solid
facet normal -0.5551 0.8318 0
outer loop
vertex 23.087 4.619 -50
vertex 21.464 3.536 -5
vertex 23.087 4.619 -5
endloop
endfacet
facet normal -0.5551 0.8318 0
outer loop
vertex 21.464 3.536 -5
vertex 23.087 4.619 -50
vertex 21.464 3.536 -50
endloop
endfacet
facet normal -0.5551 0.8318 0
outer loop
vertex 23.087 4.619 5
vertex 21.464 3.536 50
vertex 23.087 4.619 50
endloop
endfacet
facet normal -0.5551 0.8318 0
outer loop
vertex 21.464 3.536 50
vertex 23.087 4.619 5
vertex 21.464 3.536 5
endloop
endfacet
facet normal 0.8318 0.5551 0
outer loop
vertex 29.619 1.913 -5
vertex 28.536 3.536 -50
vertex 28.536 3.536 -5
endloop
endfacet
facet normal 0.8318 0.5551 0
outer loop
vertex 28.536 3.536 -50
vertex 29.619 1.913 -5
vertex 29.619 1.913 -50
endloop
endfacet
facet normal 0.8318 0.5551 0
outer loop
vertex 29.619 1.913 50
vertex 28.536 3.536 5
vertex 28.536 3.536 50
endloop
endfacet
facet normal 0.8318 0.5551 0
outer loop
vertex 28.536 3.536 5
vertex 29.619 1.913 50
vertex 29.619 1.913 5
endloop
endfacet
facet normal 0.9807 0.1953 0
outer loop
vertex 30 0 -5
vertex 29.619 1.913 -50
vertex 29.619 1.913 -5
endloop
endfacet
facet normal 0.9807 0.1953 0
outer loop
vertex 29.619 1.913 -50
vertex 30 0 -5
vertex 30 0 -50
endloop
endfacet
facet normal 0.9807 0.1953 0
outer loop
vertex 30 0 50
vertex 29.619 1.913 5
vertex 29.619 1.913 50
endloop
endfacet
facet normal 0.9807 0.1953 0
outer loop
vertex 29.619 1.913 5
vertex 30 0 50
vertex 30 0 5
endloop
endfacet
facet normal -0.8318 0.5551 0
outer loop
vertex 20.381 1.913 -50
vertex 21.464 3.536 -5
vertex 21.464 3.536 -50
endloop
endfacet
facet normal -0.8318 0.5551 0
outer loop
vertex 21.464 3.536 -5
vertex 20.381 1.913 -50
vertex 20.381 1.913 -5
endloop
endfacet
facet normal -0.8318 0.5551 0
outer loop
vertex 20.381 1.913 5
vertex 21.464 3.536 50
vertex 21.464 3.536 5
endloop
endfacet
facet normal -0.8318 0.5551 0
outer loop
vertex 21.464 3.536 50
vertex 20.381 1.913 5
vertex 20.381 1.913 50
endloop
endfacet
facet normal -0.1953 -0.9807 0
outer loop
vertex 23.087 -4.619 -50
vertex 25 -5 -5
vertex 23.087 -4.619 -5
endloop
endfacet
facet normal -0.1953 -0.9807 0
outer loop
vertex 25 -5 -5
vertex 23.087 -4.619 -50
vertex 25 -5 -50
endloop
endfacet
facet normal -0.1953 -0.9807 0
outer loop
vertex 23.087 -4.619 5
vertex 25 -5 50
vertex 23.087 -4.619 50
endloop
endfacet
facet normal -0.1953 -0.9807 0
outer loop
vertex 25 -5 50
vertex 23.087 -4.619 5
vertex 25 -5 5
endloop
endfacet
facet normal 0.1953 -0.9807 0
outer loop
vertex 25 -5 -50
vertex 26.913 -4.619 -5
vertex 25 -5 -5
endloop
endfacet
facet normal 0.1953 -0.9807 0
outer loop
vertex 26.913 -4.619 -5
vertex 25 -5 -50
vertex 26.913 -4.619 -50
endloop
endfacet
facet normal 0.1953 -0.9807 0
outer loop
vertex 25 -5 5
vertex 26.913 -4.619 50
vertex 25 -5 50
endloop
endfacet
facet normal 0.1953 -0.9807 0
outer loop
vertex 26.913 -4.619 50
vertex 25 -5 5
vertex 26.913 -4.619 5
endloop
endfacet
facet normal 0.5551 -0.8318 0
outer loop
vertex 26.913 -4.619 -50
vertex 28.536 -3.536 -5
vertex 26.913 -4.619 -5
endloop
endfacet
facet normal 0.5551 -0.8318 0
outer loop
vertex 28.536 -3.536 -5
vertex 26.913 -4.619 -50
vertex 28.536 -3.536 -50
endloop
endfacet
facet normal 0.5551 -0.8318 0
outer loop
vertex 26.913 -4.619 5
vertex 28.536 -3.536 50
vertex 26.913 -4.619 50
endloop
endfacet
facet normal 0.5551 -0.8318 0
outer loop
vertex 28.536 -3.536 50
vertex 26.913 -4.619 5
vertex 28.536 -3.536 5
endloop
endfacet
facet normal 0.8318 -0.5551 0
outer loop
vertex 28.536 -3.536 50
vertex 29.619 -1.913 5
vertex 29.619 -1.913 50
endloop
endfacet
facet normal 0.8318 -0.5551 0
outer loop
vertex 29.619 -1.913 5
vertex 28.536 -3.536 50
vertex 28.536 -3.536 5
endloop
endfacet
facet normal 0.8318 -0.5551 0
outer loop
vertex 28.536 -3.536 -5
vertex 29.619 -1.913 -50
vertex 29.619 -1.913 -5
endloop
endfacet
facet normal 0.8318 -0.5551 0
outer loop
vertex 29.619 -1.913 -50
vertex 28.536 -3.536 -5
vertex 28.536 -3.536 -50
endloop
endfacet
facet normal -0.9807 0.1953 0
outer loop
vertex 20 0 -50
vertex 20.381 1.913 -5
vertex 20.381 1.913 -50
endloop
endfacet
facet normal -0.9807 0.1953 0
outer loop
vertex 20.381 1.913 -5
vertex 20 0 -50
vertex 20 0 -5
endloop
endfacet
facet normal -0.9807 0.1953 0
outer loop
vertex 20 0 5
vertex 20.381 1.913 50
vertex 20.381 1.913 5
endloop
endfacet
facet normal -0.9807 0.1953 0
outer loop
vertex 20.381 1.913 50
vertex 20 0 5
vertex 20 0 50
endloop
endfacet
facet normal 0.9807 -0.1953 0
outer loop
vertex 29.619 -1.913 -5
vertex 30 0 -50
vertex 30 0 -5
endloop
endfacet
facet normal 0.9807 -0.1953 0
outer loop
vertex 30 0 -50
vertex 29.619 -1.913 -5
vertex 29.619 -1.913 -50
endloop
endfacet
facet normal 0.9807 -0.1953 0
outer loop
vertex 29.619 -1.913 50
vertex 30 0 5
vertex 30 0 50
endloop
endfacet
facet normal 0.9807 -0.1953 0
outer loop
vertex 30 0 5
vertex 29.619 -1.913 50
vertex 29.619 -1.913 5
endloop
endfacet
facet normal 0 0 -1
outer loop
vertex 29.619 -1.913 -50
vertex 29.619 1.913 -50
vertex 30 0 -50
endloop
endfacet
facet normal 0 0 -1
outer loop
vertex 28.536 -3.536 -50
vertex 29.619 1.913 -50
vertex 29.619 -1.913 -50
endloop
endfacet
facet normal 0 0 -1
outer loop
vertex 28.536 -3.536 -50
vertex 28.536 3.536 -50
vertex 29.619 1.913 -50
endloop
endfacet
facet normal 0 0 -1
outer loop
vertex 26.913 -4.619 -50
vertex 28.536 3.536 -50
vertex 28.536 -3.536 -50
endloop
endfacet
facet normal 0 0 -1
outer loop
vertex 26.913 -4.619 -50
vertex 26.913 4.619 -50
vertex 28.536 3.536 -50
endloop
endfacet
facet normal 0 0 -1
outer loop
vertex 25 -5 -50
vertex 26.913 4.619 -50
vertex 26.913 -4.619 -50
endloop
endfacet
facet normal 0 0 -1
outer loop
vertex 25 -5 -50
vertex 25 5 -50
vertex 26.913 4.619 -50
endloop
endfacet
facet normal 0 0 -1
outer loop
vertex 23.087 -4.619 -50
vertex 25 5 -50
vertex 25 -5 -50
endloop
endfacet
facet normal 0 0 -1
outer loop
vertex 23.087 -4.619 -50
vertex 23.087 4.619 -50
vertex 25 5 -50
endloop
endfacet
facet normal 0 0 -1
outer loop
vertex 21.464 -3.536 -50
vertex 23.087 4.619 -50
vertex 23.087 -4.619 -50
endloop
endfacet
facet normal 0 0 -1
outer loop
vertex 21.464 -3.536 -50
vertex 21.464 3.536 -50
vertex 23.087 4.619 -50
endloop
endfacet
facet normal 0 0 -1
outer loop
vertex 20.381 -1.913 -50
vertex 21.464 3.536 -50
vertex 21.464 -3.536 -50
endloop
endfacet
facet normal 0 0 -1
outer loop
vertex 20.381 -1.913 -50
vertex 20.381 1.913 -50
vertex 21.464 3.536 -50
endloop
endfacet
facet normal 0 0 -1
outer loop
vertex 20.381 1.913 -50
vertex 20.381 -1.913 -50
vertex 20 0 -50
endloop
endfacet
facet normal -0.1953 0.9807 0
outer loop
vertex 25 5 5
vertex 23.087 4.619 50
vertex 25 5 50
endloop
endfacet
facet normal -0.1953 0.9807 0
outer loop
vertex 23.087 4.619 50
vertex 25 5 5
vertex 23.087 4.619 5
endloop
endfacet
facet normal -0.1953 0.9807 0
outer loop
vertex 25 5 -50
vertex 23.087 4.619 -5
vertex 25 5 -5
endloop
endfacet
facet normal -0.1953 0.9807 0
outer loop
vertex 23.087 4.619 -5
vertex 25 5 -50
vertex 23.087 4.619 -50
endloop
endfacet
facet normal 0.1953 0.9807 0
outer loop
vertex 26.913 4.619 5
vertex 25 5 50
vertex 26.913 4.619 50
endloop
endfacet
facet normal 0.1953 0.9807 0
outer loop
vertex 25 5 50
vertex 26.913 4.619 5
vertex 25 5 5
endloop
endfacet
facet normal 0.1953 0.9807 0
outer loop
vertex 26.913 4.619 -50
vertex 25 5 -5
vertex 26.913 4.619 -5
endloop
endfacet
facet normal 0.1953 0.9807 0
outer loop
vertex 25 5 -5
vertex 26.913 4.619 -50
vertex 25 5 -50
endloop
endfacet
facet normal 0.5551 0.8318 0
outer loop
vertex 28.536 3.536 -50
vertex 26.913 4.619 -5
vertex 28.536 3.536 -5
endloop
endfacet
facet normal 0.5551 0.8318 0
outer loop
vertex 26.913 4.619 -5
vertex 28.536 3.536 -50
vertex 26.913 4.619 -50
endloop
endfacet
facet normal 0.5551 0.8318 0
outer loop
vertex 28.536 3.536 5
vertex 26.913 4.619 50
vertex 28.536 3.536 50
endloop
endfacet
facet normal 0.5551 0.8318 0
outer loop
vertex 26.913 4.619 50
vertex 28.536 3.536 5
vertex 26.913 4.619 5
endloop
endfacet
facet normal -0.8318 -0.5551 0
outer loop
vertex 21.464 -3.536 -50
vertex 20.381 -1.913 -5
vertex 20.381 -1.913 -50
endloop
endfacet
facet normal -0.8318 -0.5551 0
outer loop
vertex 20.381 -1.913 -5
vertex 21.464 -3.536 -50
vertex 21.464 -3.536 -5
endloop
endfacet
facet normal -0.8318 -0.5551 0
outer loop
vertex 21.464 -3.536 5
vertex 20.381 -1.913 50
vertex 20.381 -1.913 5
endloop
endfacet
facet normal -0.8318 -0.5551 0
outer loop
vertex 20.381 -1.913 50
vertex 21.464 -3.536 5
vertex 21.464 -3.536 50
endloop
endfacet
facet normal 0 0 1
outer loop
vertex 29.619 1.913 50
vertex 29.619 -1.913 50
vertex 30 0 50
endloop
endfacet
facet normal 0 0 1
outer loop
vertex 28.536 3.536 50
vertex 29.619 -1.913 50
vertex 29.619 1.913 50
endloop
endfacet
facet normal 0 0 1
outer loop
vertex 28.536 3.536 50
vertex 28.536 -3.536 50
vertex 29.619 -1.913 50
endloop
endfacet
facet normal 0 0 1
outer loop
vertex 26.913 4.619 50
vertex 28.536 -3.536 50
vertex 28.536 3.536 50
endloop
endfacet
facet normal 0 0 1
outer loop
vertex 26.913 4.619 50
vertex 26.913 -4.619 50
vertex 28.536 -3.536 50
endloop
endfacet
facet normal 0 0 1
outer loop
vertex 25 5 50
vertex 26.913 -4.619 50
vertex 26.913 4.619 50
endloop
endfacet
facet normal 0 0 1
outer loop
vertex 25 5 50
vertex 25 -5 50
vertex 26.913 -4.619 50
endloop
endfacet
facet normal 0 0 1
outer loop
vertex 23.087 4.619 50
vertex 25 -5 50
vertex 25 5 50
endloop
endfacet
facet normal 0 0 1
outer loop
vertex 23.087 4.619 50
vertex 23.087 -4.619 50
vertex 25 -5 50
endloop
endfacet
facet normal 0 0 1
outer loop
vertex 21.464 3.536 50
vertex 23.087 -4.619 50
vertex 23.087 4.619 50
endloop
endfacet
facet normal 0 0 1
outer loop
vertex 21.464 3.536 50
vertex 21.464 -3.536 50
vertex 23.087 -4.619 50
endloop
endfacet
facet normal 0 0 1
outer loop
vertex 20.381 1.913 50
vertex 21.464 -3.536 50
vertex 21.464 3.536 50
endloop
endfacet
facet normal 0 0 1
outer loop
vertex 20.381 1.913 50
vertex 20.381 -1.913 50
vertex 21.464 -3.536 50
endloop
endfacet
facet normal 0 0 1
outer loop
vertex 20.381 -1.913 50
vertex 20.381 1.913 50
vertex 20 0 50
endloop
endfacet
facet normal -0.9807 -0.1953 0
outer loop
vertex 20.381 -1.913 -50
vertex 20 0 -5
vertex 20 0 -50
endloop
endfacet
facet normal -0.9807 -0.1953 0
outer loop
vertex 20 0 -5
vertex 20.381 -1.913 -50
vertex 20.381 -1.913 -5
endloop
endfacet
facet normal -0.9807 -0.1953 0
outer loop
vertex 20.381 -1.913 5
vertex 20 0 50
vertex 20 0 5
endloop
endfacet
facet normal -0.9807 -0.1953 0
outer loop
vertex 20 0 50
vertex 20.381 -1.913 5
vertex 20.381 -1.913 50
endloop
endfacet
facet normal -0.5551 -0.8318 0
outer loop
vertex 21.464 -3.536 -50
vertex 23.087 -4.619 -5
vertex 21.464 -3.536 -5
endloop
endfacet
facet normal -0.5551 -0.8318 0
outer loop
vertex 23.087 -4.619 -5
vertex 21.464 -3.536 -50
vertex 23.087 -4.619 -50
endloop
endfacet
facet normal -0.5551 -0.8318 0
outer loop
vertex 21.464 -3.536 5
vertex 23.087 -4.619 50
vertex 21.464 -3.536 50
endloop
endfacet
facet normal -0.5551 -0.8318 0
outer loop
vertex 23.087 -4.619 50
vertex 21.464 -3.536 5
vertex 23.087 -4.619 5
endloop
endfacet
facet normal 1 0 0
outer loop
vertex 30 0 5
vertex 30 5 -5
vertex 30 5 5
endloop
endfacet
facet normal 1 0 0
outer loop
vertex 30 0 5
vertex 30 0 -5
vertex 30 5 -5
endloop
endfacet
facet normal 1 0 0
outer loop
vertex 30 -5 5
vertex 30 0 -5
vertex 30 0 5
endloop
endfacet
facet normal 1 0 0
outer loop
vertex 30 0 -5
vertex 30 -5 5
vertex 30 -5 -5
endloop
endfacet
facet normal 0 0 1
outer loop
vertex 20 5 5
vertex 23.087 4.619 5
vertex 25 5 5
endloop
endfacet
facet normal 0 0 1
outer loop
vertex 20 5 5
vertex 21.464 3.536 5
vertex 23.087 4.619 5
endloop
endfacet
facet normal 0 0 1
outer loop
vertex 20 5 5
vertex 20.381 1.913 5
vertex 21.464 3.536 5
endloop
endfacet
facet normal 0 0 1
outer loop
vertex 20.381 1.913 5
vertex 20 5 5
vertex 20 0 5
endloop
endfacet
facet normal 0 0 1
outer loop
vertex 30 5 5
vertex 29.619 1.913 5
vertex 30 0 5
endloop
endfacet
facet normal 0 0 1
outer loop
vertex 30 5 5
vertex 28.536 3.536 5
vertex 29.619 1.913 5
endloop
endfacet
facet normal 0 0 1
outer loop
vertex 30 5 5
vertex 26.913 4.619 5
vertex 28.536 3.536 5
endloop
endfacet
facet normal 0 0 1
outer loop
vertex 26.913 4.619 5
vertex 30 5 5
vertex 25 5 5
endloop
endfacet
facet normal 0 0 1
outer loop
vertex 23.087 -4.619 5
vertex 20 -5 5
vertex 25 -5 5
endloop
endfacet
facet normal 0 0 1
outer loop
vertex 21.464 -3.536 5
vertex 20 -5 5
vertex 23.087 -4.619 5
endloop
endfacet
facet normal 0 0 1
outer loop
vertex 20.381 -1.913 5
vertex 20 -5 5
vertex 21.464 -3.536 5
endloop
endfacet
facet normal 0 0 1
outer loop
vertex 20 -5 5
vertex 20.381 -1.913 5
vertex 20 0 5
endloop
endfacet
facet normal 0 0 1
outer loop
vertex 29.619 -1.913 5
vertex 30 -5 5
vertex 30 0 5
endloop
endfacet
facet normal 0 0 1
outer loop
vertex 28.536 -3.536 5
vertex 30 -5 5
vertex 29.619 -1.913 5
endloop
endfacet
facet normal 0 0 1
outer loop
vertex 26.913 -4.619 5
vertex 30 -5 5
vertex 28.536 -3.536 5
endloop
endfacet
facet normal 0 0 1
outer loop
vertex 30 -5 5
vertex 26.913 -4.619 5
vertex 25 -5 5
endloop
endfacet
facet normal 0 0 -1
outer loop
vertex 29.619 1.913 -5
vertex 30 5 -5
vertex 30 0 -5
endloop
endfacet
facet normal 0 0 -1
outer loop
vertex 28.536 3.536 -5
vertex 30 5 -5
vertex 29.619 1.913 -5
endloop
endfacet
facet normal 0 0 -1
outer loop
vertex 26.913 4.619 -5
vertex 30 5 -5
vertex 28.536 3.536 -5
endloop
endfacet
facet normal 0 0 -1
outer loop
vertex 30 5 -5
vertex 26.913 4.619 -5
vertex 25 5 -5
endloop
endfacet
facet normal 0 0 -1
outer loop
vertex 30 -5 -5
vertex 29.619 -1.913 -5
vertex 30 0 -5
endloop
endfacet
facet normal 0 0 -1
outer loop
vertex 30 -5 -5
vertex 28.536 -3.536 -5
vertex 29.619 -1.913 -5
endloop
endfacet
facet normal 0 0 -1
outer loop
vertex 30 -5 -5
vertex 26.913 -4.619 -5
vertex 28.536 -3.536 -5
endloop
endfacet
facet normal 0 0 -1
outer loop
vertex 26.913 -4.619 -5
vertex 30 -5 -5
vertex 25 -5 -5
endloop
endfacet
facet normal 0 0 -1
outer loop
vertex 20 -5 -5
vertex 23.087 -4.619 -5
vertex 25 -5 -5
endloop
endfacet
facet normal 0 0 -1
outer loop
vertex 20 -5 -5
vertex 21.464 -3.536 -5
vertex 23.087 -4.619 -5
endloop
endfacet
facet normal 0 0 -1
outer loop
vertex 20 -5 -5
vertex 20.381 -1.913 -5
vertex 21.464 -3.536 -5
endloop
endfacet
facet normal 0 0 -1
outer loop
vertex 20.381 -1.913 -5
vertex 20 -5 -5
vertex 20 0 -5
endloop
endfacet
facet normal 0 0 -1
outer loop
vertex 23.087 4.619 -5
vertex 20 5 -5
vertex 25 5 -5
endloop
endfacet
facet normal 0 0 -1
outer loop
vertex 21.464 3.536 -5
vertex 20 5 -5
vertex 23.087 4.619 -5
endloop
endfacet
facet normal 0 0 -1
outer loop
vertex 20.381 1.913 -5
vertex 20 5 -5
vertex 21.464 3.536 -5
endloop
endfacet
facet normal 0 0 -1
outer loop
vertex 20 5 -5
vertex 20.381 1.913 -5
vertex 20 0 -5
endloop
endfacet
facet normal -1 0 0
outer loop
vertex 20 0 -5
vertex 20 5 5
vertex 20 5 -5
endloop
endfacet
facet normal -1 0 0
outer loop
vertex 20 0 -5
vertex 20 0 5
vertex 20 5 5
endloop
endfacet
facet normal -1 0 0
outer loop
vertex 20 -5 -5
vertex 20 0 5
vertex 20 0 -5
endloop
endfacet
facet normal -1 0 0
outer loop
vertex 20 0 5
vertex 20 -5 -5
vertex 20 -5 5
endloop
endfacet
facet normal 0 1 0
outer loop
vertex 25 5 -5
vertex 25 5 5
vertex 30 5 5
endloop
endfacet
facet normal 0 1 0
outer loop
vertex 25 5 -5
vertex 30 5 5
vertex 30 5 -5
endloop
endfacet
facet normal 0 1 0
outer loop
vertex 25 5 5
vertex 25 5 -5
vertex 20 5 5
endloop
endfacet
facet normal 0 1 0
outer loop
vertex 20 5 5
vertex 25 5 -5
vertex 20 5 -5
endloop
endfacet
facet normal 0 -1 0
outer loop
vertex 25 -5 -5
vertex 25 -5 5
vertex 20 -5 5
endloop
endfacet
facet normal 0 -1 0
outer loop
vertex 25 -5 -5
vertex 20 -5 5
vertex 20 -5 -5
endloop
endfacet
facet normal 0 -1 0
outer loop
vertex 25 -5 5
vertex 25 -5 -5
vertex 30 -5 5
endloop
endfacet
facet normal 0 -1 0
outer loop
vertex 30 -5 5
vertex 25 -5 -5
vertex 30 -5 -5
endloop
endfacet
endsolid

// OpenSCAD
module hole(size) {
	cylinder(r = size, h = 100, center = true); 
	cube(size=[10, 10, 10], center=true); 
} 

translate([25, 0, 0]) {
	hole(5); 
}
